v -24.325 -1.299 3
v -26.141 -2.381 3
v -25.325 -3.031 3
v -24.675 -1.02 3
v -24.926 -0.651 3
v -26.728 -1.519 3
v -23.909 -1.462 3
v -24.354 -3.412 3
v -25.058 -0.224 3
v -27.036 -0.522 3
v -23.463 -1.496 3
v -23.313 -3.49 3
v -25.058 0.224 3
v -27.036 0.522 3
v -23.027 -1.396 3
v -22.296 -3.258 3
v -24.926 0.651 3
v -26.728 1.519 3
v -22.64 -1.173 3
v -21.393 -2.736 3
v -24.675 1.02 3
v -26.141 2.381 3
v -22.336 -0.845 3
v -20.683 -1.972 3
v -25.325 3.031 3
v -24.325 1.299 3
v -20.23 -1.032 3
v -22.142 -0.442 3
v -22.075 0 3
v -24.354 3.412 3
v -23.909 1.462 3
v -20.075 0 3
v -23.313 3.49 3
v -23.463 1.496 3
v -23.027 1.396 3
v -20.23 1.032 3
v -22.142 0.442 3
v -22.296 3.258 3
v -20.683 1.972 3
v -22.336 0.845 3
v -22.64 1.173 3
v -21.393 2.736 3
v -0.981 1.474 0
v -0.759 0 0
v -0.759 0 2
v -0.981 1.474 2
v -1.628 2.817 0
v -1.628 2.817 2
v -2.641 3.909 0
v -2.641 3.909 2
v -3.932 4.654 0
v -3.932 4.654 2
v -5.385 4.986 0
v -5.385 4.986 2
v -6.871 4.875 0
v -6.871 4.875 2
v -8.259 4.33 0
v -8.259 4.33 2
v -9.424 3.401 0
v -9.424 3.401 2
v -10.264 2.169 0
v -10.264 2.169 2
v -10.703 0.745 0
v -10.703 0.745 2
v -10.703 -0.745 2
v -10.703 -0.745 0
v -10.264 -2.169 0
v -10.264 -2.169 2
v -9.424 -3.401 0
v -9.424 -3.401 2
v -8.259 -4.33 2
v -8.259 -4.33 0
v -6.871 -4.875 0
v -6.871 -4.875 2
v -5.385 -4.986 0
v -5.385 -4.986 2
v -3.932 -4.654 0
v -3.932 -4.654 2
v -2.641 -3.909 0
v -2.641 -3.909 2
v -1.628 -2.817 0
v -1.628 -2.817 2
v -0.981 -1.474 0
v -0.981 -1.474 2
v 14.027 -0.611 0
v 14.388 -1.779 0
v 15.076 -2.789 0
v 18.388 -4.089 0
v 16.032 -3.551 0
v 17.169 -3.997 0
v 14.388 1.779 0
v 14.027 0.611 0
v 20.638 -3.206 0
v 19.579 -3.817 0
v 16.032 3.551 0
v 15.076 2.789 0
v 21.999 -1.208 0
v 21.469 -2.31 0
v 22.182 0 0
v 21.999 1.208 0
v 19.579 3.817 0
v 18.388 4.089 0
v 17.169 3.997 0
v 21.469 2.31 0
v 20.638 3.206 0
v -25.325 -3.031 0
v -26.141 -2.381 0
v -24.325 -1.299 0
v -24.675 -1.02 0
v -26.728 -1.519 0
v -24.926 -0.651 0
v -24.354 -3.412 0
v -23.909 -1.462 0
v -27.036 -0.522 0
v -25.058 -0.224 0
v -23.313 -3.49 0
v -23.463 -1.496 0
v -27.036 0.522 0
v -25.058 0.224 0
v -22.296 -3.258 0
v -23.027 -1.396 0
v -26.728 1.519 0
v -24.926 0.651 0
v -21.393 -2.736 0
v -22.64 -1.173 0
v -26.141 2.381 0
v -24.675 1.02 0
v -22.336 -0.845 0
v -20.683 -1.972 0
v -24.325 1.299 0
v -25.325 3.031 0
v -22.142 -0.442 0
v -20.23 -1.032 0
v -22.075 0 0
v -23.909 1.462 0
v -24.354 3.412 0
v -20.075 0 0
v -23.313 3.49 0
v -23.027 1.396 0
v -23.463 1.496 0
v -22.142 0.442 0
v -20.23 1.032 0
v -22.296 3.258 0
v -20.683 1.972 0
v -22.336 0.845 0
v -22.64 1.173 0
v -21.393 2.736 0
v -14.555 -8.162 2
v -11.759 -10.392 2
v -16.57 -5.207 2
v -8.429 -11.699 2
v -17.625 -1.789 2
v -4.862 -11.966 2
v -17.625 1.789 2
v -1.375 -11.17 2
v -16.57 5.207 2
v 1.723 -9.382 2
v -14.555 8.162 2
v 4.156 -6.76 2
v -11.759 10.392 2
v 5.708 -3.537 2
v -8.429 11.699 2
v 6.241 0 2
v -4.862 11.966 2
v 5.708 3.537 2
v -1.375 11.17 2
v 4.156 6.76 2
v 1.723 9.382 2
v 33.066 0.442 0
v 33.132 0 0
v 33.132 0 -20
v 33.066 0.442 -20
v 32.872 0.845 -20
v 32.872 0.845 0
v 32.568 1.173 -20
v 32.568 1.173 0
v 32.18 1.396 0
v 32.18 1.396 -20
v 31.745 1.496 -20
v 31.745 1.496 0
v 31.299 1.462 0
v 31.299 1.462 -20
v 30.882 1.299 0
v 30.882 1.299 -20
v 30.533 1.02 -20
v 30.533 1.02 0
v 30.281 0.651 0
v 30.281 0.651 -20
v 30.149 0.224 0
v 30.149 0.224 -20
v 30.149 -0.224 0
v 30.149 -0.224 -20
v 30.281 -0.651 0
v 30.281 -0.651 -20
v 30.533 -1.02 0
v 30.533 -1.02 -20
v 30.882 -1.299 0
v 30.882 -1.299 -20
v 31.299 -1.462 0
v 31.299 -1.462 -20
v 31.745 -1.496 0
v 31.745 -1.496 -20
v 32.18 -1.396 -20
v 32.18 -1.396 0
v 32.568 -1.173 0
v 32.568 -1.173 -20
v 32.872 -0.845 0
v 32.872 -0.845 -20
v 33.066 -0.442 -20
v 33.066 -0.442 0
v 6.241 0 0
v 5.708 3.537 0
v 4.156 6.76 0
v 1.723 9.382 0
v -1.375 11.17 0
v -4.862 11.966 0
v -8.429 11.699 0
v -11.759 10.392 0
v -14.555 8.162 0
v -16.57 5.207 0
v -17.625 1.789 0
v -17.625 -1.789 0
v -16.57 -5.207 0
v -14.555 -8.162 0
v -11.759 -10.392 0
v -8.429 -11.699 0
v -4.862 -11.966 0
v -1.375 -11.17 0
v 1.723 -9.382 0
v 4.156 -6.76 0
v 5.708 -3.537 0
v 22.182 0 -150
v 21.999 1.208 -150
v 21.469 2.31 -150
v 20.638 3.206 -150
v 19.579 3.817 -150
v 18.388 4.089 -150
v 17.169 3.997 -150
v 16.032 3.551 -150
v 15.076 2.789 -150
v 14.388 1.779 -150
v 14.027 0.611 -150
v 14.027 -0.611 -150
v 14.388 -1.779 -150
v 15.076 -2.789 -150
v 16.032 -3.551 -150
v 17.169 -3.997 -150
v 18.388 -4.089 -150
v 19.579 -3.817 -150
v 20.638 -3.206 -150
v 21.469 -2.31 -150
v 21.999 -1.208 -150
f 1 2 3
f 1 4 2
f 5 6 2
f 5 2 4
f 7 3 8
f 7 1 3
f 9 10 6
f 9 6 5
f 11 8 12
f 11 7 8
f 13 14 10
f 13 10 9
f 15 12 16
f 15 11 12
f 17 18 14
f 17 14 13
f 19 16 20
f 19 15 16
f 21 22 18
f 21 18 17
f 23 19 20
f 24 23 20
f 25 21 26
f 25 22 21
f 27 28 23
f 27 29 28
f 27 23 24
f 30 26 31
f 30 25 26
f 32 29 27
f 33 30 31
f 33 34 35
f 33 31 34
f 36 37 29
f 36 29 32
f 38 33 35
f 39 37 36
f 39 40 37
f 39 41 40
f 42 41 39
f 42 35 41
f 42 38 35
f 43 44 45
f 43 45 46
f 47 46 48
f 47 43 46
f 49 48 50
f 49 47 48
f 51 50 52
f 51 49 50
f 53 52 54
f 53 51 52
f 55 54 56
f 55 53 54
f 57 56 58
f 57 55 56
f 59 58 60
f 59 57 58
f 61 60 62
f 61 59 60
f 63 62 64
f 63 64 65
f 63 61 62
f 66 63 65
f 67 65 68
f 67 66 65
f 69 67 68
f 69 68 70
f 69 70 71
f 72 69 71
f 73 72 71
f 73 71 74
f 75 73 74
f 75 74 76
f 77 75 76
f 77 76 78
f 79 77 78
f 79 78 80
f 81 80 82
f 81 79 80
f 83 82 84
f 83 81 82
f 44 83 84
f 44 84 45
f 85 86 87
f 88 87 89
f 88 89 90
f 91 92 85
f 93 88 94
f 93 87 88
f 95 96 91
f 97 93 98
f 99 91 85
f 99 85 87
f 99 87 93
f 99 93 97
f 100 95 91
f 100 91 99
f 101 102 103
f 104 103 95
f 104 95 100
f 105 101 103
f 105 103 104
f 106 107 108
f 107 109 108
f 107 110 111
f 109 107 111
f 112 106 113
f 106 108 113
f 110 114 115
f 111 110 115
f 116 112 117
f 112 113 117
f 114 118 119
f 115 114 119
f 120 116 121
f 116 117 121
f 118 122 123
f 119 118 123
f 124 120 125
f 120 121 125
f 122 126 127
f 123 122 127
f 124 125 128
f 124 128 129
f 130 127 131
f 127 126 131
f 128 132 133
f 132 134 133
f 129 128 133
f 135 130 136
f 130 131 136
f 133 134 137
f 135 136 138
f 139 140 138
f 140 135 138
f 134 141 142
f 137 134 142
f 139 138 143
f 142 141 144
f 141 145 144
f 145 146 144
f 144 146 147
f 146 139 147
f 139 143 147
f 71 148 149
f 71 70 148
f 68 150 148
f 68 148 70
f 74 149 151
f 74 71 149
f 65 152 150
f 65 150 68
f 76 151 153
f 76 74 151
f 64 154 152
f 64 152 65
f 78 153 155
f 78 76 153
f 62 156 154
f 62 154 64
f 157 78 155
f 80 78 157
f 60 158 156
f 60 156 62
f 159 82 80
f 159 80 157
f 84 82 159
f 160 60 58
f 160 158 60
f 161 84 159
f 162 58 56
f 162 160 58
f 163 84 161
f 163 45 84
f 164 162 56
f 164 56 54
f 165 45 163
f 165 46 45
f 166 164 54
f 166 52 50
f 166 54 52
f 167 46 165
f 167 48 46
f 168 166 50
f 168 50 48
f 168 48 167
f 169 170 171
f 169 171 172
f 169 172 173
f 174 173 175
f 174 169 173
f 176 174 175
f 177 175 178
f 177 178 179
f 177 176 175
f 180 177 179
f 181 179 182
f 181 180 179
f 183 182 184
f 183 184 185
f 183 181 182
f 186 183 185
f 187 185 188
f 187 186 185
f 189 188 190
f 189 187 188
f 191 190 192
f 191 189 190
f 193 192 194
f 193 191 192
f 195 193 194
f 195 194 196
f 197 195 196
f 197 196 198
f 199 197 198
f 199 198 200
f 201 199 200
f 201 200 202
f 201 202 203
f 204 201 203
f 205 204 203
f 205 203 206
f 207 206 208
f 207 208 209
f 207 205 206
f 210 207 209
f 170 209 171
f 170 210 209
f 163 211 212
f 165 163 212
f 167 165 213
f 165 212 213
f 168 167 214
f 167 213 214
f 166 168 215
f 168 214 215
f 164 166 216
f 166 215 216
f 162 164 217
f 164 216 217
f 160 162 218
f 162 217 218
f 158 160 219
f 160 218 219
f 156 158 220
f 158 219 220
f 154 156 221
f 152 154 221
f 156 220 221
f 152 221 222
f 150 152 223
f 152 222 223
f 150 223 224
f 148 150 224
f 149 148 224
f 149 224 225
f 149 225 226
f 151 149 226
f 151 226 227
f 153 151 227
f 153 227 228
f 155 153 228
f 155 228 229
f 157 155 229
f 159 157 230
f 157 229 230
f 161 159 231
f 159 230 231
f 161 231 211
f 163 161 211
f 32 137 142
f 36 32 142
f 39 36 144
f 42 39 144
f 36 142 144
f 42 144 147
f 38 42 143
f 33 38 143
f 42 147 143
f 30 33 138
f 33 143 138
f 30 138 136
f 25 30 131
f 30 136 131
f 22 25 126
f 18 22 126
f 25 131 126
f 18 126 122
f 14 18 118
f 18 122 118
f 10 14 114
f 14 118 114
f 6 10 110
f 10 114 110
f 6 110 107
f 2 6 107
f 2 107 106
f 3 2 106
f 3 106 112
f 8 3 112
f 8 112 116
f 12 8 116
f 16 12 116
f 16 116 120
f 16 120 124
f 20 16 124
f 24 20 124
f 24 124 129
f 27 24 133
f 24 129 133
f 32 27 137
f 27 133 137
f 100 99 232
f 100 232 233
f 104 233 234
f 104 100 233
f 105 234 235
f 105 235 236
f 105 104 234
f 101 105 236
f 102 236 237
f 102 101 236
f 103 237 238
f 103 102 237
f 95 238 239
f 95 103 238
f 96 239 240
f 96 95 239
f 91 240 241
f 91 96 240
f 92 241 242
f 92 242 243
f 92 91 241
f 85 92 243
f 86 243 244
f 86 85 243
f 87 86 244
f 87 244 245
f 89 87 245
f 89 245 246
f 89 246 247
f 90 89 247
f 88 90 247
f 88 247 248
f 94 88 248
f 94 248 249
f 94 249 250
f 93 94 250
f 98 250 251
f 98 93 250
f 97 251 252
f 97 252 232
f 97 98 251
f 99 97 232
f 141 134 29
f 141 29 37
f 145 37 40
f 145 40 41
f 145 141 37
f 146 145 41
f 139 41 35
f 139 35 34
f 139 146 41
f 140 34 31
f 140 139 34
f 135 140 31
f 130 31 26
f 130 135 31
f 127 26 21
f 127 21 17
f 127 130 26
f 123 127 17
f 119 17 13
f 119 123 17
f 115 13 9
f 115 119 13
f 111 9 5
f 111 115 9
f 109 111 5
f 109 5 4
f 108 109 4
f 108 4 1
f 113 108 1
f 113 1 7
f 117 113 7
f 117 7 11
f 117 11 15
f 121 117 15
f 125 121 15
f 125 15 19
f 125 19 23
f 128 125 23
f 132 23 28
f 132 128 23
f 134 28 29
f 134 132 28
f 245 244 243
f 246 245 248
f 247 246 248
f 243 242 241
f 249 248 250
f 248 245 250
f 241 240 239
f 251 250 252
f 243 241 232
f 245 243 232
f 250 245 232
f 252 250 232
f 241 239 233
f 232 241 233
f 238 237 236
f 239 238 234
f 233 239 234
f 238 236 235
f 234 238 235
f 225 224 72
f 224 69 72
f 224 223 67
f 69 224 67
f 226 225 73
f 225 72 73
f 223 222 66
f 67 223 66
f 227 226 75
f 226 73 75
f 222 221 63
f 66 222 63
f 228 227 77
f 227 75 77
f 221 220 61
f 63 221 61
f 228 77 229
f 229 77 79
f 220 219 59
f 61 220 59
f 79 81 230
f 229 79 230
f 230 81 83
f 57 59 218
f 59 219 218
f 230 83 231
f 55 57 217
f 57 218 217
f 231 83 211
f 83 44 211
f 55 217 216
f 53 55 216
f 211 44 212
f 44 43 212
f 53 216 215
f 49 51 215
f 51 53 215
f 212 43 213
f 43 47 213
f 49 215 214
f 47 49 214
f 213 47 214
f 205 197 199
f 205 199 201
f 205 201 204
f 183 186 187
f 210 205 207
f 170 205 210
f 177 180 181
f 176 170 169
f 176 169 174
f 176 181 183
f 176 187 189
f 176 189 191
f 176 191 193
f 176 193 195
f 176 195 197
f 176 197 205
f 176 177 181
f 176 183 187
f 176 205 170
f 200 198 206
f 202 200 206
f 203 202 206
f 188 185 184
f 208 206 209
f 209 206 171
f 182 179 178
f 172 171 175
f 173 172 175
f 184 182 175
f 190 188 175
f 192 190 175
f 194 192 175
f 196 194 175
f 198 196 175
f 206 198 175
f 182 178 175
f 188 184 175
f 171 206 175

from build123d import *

# Parameters (mm, degrees)
F0_R     = 3.5
F0_R_2   = 1.5
F1_DEPTH = 3
F0_R_3   = 12
F0_R_4   = 5
F2_DEPTH = 2
F0_R_5   = 4.1
F3_DEPTH = 150
F4_DEPTH = 20


with BuildPart() as f1:
    # F0 (on Top) → F1 (new body)
    with BuildSketch(Plane.XY):
        with Locations((-23.574933, 0)):
            Circle(F0_R)
        with Locations((-23.574933, 0)):
            Circle(F0_R_2, mode=Mode.SUBTRACT)
    extrude(amount=F1_DEPTH)


with BuildPart() as f2:
    # F0 (on Top) → F2 (new body)
    with BuildSketch(Plane.XY):
        with Locations((-5.758761, 0)):
            Circle(F0_R_3)
        with Locations((-5.758761, 0)):
            Circle(F0_R_4, mode=Mode.SUBTRACT)
    extrude(amount=F2_DEPTH)


with BuildPart() as f3:
    # F0 (on Top) → F3 (new body)
    with BuildSketch(Plane.XY):
        with Locations((18.081572, 0)):
            Circle(F0_R_5)
    extrude(amount=-F3_DEPTH)


with BuildPart() as f4:
    # F0 (on Top) → F4 (new body)
    with BuildSketch(Plane.XY):
        with Locations((31.632435, 0)):
            Circle(F0_R_2)
    extrude(amount=-F4_DEPTH)


solid = Compound([f1.part, f2.part, f3.part, f4.part])
